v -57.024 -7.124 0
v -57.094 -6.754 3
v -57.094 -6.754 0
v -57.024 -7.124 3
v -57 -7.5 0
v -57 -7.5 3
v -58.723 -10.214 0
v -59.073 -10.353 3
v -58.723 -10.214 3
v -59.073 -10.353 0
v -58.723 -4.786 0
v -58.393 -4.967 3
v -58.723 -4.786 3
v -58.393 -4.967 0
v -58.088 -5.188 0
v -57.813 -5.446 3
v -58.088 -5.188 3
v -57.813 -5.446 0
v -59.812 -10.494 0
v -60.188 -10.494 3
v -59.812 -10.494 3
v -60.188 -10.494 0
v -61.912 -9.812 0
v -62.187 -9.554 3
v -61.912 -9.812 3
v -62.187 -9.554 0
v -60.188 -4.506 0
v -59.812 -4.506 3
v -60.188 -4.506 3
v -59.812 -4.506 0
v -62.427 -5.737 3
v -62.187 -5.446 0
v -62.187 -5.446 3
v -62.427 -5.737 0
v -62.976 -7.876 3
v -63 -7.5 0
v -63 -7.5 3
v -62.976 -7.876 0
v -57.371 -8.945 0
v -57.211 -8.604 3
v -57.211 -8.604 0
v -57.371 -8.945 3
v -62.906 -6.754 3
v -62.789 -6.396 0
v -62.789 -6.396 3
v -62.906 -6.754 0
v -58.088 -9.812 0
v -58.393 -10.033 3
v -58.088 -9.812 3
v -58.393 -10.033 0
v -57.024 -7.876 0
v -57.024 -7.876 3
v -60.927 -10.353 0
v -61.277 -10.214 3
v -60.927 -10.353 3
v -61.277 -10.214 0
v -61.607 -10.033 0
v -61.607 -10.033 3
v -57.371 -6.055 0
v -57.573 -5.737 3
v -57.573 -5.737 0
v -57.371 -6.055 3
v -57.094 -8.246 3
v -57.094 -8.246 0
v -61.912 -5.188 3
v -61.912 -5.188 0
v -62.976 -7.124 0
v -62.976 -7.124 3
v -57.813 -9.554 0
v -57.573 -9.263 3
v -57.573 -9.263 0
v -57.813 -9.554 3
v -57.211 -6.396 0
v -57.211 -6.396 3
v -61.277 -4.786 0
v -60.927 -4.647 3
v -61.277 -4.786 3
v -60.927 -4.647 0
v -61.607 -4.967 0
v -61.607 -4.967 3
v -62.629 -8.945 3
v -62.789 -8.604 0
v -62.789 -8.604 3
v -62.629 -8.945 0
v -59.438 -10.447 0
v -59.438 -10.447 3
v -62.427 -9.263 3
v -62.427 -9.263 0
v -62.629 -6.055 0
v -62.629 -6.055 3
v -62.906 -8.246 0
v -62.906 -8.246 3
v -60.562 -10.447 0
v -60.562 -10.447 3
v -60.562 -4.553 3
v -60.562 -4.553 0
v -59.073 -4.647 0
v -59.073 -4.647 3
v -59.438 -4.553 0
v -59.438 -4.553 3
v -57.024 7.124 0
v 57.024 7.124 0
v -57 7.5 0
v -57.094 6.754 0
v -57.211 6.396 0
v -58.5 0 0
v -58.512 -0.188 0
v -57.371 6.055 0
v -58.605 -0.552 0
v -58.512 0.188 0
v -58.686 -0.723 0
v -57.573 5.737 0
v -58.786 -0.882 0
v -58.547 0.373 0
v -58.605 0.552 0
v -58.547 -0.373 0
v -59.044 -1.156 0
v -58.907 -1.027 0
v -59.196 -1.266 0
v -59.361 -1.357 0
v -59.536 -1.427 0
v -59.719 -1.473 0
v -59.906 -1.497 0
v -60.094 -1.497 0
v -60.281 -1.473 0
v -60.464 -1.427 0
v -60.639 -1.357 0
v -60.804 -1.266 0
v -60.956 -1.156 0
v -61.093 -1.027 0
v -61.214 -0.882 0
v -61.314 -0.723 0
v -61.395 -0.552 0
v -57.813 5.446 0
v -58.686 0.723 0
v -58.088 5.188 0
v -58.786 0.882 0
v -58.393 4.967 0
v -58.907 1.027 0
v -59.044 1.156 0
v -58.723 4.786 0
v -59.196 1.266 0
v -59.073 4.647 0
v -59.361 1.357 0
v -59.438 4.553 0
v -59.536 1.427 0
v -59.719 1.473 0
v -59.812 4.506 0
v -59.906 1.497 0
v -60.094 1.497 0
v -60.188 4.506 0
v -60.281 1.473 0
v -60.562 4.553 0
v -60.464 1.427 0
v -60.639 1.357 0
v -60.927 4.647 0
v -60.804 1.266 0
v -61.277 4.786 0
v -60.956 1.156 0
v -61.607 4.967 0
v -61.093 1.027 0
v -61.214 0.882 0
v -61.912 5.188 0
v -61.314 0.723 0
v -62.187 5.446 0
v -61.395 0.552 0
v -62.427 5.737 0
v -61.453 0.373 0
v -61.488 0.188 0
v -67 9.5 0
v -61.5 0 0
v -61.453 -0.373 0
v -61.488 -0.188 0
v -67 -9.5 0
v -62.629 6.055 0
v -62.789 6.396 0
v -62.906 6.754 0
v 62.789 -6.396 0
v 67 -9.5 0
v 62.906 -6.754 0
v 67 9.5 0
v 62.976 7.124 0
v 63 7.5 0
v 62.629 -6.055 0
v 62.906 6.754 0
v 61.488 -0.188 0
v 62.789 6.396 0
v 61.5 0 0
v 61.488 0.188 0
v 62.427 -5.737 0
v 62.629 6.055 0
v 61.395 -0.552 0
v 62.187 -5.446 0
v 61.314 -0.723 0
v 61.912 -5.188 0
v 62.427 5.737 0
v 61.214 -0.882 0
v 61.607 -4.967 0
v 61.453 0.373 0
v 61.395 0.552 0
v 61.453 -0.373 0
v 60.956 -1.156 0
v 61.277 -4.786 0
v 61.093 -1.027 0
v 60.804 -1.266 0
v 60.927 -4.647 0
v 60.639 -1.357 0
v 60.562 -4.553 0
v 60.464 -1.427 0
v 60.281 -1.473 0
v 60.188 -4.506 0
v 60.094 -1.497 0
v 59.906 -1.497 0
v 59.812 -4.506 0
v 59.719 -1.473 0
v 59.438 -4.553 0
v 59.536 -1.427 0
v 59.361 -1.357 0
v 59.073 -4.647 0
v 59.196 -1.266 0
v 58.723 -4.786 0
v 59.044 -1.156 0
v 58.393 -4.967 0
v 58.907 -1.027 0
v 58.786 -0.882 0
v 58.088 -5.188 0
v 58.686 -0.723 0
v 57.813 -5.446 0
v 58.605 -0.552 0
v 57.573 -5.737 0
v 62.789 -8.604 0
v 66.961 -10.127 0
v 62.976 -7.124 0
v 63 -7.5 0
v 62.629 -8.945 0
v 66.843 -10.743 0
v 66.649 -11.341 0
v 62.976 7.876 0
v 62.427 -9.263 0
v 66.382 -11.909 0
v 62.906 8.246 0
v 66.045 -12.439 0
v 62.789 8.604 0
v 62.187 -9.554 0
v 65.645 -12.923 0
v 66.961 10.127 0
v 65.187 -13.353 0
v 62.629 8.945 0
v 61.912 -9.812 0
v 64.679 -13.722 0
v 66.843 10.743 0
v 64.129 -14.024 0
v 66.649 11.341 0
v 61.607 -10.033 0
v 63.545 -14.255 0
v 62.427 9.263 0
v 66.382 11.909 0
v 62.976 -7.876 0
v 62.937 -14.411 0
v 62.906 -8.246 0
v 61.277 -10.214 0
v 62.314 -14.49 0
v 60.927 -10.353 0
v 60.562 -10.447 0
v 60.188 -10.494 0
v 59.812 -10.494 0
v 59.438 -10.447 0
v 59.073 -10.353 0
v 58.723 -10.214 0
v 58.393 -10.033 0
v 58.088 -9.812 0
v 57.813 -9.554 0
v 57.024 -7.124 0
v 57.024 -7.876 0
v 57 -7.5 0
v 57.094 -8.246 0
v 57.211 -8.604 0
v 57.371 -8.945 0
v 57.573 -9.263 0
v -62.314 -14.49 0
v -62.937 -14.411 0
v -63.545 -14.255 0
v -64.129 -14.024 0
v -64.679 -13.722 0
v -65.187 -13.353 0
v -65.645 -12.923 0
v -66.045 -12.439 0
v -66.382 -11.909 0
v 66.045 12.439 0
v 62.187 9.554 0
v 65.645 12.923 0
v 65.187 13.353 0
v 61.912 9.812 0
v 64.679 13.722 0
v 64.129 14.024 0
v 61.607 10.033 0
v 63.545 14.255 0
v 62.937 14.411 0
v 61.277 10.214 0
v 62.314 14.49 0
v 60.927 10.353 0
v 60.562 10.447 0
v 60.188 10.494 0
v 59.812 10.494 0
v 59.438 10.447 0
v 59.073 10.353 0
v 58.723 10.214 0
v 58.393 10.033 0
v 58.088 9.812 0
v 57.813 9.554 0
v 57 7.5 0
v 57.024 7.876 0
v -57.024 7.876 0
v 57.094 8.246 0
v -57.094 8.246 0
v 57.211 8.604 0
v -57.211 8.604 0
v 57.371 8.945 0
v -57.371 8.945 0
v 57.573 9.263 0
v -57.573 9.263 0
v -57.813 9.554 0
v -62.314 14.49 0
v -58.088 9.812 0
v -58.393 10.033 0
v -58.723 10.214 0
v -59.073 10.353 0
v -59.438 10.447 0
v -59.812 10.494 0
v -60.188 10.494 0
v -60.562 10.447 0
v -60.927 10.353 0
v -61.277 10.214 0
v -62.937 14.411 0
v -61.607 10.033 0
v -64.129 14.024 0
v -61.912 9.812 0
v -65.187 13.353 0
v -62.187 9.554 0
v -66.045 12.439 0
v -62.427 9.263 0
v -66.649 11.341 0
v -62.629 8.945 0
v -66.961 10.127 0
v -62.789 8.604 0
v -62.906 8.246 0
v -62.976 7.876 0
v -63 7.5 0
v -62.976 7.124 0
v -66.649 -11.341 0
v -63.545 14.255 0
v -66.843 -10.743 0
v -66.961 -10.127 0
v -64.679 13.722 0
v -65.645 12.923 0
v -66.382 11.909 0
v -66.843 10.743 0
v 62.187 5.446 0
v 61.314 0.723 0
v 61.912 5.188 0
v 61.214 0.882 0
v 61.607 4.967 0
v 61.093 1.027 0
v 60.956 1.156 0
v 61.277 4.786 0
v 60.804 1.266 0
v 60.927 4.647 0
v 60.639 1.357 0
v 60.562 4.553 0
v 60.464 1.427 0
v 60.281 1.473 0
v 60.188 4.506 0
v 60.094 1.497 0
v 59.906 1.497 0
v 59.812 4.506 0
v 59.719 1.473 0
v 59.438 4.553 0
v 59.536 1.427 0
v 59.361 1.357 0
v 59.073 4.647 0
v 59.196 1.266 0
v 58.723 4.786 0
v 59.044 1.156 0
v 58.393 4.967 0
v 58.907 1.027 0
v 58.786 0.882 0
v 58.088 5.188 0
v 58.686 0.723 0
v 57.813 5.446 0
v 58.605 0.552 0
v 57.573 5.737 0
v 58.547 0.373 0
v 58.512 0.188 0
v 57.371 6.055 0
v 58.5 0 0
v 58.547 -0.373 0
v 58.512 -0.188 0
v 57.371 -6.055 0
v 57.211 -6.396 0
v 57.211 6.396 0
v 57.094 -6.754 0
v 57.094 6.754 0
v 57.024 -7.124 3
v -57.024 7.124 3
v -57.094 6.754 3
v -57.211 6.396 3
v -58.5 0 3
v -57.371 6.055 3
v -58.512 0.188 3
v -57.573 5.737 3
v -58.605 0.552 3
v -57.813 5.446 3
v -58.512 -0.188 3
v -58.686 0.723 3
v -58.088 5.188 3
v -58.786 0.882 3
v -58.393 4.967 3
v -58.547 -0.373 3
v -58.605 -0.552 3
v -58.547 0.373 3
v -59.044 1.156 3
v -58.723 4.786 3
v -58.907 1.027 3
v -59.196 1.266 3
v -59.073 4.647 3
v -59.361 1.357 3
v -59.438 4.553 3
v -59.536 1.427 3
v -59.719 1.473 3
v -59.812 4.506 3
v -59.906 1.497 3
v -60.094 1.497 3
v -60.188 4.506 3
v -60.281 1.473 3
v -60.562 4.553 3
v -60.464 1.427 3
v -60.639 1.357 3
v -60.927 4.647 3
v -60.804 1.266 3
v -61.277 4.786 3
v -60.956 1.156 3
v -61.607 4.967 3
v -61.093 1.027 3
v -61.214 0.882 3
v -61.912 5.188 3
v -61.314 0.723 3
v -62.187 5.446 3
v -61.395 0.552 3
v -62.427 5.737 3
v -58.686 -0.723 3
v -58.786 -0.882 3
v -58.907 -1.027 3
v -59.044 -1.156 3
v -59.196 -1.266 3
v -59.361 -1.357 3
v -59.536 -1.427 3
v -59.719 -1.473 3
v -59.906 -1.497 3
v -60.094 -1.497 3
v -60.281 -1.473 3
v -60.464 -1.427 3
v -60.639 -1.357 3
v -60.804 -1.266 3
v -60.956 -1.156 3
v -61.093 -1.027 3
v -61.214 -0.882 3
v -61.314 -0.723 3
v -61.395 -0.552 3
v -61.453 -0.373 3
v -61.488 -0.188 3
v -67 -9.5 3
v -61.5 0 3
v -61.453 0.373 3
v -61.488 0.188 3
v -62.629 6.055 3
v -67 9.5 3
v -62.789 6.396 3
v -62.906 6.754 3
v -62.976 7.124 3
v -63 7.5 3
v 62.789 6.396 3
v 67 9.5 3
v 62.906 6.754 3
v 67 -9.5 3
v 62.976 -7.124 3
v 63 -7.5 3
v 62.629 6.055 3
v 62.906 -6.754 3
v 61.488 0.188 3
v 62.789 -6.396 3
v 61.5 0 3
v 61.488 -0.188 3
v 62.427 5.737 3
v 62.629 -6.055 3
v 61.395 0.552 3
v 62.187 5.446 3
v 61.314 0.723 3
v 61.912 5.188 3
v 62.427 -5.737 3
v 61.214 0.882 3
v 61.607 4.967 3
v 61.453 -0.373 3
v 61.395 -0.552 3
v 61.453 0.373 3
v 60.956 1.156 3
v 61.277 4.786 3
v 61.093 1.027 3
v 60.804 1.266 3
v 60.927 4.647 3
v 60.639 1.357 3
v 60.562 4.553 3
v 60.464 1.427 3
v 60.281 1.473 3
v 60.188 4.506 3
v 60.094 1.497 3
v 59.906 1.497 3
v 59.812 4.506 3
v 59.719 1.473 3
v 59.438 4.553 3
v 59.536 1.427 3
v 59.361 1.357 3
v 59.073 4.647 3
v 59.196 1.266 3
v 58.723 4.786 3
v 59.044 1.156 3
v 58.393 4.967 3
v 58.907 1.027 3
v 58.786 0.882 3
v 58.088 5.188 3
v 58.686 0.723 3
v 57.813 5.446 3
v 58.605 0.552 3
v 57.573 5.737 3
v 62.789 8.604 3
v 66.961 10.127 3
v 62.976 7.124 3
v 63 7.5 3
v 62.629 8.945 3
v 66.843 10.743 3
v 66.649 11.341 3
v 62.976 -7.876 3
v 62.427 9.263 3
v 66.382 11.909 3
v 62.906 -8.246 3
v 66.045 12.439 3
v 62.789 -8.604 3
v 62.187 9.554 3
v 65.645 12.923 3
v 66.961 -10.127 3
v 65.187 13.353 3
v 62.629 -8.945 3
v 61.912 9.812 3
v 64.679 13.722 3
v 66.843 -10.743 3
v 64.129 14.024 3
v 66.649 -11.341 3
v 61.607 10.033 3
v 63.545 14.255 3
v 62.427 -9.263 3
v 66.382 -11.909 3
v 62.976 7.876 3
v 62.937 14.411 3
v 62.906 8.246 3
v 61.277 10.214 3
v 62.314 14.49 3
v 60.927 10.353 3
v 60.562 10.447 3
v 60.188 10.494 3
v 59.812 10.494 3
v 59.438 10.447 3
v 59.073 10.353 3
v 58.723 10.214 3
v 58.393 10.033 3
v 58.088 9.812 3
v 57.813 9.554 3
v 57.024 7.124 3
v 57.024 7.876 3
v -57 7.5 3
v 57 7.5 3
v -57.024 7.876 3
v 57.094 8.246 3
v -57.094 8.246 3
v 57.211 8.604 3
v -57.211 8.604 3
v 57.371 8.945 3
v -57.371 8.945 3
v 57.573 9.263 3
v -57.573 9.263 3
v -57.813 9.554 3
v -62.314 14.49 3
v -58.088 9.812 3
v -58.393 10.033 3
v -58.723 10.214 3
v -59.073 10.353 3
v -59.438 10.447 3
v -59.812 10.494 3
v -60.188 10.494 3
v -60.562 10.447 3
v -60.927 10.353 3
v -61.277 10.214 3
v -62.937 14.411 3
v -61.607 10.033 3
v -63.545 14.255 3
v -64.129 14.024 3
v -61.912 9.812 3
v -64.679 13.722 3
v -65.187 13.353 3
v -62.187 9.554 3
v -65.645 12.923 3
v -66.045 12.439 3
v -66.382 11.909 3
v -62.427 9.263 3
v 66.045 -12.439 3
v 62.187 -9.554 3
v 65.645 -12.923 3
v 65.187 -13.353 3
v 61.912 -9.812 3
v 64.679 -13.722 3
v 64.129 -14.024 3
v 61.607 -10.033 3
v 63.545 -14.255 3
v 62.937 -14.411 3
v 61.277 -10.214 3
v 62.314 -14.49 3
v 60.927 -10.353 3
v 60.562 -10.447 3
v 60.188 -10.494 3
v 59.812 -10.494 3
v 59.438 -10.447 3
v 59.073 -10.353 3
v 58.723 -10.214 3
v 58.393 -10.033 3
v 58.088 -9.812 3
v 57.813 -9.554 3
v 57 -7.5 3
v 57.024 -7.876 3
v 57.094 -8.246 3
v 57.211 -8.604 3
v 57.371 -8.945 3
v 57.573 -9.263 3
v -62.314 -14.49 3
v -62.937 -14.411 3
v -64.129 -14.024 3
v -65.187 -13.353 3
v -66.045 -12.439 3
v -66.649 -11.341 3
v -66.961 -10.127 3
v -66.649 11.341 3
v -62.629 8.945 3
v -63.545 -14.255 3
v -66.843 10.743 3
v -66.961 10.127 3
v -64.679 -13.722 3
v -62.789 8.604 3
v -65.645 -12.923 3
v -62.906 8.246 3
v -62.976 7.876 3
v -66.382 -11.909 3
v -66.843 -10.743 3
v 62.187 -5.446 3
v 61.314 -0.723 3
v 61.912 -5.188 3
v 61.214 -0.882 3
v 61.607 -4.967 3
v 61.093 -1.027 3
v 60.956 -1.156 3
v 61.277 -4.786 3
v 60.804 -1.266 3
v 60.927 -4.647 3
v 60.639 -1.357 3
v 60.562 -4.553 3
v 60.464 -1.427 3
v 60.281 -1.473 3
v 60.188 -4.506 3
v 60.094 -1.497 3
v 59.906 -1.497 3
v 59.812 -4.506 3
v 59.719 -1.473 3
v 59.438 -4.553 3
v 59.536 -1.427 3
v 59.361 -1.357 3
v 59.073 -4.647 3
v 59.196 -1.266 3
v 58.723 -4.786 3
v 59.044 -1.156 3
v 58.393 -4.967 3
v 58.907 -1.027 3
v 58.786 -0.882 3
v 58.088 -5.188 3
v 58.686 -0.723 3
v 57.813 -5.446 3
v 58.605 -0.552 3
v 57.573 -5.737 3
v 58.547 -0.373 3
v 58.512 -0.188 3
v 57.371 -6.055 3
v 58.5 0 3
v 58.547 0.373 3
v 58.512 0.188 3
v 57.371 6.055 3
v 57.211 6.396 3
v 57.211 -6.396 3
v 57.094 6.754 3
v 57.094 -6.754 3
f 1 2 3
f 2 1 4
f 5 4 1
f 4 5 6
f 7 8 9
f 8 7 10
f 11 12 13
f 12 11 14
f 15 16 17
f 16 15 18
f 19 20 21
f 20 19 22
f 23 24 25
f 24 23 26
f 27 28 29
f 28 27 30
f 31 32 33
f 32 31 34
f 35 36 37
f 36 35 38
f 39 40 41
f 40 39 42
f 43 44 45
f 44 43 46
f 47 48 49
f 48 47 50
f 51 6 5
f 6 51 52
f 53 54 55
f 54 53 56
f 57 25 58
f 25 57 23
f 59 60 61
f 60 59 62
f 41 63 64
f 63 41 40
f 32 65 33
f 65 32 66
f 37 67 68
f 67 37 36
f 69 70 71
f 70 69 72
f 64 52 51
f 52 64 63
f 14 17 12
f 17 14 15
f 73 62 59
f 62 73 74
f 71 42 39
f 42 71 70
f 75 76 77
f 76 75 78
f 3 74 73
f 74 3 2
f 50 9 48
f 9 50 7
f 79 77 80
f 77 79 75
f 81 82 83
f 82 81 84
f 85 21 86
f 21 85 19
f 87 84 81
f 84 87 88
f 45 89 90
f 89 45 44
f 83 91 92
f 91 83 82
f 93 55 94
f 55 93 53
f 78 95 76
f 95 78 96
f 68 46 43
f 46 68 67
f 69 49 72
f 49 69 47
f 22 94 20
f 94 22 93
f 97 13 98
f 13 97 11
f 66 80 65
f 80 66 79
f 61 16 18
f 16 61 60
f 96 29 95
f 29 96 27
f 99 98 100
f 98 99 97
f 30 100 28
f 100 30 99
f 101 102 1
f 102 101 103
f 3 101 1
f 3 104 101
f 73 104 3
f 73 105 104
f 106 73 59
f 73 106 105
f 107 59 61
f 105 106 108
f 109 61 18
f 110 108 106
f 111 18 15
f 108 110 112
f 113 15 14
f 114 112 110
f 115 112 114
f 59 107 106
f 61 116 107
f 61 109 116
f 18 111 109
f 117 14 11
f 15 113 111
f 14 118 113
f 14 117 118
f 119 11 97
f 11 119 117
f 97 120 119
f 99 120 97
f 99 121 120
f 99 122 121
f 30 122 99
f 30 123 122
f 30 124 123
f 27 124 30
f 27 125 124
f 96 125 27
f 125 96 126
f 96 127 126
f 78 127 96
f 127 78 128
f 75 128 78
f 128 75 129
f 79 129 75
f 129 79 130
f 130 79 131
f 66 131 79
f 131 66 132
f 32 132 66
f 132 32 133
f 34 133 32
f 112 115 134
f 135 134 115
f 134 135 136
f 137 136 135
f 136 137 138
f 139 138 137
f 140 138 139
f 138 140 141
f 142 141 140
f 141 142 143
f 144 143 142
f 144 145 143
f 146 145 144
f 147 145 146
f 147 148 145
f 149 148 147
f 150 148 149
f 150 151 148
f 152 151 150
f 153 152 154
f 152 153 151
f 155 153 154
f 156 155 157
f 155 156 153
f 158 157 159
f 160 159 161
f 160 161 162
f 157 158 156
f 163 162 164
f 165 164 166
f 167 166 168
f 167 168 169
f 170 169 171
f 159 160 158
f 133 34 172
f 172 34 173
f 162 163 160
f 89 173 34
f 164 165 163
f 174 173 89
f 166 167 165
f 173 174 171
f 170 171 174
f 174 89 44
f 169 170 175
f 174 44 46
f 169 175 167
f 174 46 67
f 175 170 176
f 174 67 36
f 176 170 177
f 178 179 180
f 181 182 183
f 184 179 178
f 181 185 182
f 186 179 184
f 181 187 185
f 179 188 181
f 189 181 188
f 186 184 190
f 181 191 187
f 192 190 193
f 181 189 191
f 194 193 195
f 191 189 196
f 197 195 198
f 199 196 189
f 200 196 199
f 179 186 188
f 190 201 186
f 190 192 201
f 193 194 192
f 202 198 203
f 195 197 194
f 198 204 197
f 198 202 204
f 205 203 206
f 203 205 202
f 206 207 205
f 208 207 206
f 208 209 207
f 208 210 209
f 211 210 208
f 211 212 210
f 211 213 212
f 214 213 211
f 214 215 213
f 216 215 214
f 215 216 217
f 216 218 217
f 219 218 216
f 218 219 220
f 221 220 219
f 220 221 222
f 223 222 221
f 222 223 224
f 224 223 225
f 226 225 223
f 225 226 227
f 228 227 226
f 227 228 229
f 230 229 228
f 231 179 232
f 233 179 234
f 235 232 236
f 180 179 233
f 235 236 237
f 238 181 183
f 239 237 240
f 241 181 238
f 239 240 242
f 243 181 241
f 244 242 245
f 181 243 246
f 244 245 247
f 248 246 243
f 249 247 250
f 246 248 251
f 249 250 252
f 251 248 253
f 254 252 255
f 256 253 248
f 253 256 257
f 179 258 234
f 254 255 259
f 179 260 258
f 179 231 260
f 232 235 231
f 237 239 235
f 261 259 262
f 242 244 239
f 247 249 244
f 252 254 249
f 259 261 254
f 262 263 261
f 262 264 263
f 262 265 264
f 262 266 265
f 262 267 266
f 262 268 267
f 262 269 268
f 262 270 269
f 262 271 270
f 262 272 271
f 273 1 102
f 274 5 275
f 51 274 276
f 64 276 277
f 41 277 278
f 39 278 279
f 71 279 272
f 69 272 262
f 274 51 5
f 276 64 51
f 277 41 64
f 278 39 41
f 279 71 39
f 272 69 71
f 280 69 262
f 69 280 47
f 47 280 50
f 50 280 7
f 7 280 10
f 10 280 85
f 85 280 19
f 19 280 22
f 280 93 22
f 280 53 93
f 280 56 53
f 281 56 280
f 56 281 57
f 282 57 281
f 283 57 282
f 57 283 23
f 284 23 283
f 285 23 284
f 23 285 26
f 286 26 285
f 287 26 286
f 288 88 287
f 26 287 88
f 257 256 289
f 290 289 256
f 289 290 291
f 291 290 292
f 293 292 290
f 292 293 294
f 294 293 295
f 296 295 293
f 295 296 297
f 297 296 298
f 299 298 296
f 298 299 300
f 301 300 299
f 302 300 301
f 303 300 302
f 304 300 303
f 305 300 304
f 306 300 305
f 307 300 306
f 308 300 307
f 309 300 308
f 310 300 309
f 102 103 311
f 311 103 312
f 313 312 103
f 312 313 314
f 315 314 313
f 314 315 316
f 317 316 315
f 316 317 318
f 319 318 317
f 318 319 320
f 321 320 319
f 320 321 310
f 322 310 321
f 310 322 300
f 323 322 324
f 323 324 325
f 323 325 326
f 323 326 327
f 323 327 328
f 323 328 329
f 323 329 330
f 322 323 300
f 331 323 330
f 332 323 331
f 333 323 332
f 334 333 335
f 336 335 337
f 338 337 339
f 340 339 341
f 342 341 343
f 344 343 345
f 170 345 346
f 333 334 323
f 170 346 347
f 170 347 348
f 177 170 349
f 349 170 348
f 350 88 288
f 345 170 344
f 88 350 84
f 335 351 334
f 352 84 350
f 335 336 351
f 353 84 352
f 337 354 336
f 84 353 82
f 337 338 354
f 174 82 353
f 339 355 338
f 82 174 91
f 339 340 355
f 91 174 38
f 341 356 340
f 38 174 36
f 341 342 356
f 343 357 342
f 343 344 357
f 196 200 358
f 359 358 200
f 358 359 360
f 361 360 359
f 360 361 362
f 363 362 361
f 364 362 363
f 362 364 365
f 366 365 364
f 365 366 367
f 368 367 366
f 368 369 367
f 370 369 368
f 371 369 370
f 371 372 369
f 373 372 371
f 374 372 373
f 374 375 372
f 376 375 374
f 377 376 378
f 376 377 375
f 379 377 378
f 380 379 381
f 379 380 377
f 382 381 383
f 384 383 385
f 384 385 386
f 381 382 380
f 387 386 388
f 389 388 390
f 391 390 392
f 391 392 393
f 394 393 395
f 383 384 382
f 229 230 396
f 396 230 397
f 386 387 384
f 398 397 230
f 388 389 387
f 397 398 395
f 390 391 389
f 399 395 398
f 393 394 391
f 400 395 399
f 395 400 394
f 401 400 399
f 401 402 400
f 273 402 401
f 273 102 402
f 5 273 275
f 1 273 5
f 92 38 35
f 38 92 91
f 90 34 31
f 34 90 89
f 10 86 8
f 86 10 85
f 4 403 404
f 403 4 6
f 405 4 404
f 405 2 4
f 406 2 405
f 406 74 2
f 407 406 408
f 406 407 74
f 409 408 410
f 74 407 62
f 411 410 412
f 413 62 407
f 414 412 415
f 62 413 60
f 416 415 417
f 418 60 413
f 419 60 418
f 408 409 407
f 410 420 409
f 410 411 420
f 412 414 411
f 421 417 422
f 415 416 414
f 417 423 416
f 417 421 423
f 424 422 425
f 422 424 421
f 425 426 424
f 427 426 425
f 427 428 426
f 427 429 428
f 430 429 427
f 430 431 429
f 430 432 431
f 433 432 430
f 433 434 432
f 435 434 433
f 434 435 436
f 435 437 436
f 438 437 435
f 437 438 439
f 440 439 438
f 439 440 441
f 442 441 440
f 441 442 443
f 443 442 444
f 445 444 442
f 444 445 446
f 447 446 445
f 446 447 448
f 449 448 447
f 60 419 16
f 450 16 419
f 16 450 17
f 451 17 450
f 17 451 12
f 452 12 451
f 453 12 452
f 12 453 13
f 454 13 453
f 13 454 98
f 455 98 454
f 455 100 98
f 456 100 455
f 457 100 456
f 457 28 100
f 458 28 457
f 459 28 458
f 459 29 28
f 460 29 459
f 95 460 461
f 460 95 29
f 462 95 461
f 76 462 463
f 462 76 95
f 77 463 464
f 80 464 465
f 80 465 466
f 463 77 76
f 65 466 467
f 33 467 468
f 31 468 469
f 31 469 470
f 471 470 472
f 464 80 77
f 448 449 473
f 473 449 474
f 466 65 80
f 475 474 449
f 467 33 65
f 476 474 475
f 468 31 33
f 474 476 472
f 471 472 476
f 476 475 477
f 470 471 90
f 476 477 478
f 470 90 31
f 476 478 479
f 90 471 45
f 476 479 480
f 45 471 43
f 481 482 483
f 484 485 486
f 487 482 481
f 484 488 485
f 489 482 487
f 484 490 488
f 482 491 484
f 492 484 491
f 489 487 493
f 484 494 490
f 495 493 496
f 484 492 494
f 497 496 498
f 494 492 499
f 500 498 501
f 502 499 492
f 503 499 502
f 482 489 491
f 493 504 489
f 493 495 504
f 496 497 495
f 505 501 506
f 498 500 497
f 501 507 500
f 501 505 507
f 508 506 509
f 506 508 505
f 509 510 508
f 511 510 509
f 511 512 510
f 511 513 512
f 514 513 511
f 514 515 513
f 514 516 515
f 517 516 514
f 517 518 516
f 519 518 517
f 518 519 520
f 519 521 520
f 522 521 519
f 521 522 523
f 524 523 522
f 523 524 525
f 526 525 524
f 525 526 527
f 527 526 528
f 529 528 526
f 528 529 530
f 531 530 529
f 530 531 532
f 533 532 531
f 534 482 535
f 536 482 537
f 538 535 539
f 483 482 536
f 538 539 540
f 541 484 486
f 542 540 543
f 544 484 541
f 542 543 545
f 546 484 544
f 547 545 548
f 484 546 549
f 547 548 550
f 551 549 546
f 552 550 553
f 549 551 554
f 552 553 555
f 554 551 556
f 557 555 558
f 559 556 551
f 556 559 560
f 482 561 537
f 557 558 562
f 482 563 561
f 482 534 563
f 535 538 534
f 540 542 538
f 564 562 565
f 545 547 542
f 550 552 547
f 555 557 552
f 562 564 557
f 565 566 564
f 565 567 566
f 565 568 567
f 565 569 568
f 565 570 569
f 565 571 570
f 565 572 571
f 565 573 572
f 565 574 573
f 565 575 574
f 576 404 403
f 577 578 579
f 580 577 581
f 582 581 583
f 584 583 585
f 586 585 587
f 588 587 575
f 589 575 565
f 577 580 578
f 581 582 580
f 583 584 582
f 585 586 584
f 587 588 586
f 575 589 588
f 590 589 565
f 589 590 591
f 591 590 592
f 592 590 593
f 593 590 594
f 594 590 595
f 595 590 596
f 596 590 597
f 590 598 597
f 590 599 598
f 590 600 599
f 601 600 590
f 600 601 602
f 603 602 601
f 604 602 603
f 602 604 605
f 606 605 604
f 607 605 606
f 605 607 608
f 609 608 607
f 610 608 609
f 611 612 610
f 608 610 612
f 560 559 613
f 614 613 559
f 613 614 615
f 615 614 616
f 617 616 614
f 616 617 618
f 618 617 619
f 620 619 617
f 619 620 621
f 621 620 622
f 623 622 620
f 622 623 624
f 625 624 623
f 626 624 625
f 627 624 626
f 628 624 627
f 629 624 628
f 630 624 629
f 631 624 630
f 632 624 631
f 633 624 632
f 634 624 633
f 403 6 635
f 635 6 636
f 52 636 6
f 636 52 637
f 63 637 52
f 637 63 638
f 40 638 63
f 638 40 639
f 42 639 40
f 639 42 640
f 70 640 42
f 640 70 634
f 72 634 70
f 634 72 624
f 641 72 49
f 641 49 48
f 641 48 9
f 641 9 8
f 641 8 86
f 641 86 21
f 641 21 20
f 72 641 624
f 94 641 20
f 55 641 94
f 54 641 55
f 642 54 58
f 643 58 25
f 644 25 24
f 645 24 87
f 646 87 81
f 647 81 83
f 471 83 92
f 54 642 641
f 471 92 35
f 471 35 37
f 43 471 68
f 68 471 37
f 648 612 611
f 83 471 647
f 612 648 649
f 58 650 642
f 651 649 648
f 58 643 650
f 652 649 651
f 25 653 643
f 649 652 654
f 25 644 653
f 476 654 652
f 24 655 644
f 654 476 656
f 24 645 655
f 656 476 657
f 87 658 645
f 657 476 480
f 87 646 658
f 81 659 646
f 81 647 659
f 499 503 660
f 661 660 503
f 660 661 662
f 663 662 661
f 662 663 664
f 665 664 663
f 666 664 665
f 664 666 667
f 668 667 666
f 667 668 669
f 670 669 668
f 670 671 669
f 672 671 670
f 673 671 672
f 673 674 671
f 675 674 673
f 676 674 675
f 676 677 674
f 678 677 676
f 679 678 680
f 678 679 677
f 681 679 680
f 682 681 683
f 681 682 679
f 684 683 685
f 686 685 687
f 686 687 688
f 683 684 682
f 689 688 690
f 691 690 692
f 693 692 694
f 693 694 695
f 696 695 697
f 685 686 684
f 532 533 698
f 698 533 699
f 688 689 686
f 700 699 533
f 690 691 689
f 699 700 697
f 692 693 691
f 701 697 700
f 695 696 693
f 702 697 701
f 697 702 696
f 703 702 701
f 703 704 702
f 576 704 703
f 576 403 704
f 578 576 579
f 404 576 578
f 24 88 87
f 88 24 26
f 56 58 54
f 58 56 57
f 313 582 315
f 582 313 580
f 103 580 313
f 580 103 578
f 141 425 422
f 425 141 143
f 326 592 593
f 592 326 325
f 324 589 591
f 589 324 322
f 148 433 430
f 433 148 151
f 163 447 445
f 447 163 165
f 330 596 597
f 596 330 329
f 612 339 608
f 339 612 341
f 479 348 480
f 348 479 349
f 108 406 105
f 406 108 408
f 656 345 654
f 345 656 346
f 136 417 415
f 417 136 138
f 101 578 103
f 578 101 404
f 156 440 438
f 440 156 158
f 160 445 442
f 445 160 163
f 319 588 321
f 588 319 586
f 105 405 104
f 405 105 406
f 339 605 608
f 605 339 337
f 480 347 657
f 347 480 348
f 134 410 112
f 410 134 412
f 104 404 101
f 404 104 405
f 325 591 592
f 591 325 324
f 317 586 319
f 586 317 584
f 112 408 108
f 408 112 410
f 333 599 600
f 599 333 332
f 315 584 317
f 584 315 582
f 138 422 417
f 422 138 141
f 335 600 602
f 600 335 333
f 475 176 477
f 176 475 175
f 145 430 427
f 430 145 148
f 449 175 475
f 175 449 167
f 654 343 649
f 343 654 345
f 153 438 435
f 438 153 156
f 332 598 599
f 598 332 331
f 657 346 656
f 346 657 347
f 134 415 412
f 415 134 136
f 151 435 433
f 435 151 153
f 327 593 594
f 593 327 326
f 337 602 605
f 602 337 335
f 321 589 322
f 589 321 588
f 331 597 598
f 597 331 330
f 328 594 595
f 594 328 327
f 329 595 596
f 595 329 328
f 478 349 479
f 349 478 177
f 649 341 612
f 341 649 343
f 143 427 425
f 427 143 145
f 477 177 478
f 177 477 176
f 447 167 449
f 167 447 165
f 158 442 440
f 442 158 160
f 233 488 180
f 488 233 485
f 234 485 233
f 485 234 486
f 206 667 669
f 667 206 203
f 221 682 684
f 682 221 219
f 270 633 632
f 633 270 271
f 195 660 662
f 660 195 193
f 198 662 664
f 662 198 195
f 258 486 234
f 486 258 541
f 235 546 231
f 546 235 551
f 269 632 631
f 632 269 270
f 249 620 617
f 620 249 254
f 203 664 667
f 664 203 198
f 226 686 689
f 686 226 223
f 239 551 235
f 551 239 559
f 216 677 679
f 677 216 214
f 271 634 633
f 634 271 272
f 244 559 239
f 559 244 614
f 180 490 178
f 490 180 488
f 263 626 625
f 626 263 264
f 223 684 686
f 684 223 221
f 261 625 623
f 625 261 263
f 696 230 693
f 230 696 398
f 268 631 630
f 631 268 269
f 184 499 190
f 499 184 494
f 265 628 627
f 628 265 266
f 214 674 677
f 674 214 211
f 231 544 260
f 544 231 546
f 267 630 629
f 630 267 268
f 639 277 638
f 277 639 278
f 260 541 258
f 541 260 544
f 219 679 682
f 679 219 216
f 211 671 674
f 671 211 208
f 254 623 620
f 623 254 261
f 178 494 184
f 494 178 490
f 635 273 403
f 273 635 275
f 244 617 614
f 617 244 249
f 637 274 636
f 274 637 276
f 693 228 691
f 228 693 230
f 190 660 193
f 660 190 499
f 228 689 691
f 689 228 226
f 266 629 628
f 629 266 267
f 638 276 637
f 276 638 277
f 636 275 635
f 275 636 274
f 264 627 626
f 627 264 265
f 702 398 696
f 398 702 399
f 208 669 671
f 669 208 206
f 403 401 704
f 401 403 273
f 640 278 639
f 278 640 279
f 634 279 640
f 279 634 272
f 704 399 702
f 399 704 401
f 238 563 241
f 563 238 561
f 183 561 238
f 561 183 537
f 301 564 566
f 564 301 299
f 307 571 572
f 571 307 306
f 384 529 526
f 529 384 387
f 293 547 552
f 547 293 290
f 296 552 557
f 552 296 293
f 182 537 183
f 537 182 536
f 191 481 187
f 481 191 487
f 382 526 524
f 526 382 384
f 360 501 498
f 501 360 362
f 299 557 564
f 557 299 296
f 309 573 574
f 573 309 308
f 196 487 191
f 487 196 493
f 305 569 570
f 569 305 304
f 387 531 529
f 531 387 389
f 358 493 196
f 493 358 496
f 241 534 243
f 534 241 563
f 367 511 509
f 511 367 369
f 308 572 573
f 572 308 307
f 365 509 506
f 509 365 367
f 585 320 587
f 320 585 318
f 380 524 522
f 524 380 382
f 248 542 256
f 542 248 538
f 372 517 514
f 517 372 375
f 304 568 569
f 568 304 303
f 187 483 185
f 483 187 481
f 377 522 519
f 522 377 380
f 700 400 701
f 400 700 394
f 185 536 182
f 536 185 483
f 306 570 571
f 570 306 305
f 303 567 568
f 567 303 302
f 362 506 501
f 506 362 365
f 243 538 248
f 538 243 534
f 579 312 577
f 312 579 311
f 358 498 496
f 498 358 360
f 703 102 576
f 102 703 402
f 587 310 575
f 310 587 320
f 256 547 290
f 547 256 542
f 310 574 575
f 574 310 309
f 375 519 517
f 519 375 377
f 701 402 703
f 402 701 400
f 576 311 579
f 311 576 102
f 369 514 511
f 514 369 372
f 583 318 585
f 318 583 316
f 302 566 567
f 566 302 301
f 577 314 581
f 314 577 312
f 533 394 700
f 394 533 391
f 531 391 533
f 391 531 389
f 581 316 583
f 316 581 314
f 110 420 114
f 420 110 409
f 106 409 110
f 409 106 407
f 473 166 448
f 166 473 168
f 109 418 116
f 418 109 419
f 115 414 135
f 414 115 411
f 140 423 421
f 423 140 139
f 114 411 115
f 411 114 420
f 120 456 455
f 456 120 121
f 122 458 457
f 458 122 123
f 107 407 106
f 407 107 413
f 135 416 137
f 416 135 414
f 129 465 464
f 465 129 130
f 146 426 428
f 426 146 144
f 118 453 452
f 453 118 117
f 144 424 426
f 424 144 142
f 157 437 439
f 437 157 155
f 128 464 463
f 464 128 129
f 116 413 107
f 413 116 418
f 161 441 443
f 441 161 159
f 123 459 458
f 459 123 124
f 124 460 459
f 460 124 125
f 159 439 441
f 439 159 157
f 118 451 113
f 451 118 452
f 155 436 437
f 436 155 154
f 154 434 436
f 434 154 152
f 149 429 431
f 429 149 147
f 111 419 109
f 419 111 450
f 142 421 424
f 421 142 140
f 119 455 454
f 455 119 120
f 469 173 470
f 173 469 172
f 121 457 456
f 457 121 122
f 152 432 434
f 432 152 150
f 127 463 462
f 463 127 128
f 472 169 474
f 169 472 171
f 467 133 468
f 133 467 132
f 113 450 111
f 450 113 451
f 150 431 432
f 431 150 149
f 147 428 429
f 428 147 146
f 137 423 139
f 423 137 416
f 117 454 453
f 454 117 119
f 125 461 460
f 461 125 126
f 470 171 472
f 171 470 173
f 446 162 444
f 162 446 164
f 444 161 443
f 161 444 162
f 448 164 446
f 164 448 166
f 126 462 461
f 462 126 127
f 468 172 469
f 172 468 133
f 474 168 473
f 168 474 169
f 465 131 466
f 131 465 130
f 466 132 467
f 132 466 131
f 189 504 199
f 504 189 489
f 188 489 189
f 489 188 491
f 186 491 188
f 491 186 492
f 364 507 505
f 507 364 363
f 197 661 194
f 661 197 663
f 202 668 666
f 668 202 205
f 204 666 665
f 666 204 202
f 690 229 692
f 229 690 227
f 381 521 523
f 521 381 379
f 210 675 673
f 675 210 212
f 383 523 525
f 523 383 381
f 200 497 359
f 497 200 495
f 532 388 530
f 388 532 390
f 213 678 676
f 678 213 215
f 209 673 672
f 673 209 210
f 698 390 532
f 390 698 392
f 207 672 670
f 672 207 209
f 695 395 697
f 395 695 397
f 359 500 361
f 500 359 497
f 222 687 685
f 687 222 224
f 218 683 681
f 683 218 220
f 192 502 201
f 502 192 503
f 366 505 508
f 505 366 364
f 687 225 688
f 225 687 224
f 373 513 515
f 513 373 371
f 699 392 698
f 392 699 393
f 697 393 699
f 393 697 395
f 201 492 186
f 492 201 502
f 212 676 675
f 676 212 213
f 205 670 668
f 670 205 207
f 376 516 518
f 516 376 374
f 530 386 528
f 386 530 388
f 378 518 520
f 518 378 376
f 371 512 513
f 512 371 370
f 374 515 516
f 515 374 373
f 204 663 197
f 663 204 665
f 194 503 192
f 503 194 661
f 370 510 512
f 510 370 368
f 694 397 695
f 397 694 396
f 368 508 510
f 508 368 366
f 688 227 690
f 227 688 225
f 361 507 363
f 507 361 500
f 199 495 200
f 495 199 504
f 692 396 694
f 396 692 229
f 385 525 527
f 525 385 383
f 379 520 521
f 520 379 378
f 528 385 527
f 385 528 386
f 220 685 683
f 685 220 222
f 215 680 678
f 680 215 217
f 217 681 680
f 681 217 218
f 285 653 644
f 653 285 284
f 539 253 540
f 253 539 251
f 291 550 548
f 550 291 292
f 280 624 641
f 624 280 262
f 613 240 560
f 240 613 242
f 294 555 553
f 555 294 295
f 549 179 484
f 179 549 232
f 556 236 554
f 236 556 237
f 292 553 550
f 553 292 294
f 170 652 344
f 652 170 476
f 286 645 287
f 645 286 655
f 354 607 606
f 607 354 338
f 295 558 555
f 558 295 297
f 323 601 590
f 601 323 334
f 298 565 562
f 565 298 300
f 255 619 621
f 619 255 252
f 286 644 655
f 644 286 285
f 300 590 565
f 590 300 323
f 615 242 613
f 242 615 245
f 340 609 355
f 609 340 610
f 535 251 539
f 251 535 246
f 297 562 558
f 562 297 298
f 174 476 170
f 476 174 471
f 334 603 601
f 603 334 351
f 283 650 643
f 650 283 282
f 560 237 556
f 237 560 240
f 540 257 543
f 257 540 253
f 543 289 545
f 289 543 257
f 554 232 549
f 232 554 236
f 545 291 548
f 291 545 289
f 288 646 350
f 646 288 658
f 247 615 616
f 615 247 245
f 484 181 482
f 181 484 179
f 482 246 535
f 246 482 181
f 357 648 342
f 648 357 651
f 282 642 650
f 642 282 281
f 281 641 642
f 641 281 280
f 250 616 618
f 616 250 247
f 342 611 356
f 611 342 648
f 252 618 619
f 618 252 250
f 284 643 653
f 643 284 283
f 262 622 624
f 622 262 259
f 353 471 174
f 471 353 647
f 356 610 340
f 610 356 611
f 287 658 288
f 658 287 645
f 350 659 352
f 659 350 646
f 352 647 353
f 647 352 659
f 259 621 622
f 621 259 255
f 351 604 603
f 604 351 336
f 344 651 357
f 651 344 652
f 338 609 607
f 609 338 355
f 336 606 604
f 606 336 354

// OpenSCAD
$fn = 50;


difference() {
	union() {
		hull() {
			translate(v = [-62.0000000000, 9.5000000000, 0]) {
				cylinder(h = 3, r = 5);
			}
			translate(v = [62.0000000000, 9.5000000000, 0]) {
				cylinder(h = 3, r = 5);
			}
			translate(v = [-62.0000000000, -9.5000000000, 0]) {
				cylinder(h = 3, r = 5);
			}
			translate(v = [62.0000000000, -9.5000000000, 0]) {
				cylinder(h = 3, r = 5);
			}
		}
	}
	union() {
		translate(v = [-60.0000000000, -7.5000000000, 0]) {
			cylinder(h = 3, r = 3.0000000000);
		}
		translate(v = [-60.0000000000, 7.5000000000, 0]) {
			cylinder(h = 3, r = 3.0000000000);
		}
		translate(v = [60.0000000000, -7.5000000000, 0]) {
			cylinder(h = 3, r = 3.0000000000);
		}
		translate(v = [60.0000000000, 7.5000000000, 0]) {
			cylinder(h = 3, r = 3.0000000000);
		}
		translate(v = [-60.0000000000, -7.5000000000, 0]) {
			cylinder(h = 3, r = 1.5000000000);
		}
		translate(v = [-60.0000000000, 0.0000000000, 0]) {
			cylinder(h = 3, r = 1.5000000000);
		}
		translate(v = [-60.0000000000, 7.5000000000, 0]) {
			cylinder(h = 3, r = 1.5000000000);
		}
		translate(v = [60.0000000000, -7.5000000000, 0]) {
			cylinder(h = 3, r = 1.5000000000);
		}
		translate(v = [60.0000000000, 0.0000000000, 0]) {
			cylinder(h = 3, r = 1.5000000000);
		}
		translate(v = [60.0000000000, 7.5000000000, 0]) {
			cylinder(h = 3, r = 1.5000000000);
		}
		translate(v = [-60.0000000000, -7.5000000000, 0]) {
			cylinder(h = 3, r = 1.5000000000);
		}
		translate(v = [-60.0000000000, 0.0000000000, 0]) {
			cylinder(h = 3, r = 1.5000000000);
		}
		translate(v = [-60.0000000000, 7.5000000000, 0]) {
			cylinder(h = 3, r = 1.5000000000);
		}
		translate(v = [60.0000000000, -7.5000000000, 0]) {
			cylinder(h = 3, r = 1.5000000000);
		}
		translate(v = [60.0000000000, 0.0000000000, 0]) {
			cylinder(h = 3, r = 1.5000000000);
		}
		translate(v = [60.0000000000, 7.5000000000, 0]) {
			cylinder(h = 3, r = 1.5000000000);
		}
		translate(v = [-60.0000000000, -7.5000000000, 0]) {
			cylinder(h = 3, r = 1.5000000000);
		}
		translate(v = [-60.0000000000, 0.0000000000, 0]) {
			cylinder(h = 3, r = 1.5000000000);
		}
		translate(v = [-60.0000000000, 7.5000000000, 0]) {
			cylinder(h = 3, r = 1.5000000000);
		}
		translate(v = [60.0000000000, -7.5000000000, 0]) {
			cylinder(h = 3, r = 1.5000000000);
		}
		translate(v = [60.0000000000, 0.0000000000, 0]) {
			cylinder(h = 3, r = 1.5000000000);
		}
		translate(v = [60.0000000000, 7.5000000000, 0]) {
			cylinder(h = 3, r = 1.5000000000);
		}
	}
}
